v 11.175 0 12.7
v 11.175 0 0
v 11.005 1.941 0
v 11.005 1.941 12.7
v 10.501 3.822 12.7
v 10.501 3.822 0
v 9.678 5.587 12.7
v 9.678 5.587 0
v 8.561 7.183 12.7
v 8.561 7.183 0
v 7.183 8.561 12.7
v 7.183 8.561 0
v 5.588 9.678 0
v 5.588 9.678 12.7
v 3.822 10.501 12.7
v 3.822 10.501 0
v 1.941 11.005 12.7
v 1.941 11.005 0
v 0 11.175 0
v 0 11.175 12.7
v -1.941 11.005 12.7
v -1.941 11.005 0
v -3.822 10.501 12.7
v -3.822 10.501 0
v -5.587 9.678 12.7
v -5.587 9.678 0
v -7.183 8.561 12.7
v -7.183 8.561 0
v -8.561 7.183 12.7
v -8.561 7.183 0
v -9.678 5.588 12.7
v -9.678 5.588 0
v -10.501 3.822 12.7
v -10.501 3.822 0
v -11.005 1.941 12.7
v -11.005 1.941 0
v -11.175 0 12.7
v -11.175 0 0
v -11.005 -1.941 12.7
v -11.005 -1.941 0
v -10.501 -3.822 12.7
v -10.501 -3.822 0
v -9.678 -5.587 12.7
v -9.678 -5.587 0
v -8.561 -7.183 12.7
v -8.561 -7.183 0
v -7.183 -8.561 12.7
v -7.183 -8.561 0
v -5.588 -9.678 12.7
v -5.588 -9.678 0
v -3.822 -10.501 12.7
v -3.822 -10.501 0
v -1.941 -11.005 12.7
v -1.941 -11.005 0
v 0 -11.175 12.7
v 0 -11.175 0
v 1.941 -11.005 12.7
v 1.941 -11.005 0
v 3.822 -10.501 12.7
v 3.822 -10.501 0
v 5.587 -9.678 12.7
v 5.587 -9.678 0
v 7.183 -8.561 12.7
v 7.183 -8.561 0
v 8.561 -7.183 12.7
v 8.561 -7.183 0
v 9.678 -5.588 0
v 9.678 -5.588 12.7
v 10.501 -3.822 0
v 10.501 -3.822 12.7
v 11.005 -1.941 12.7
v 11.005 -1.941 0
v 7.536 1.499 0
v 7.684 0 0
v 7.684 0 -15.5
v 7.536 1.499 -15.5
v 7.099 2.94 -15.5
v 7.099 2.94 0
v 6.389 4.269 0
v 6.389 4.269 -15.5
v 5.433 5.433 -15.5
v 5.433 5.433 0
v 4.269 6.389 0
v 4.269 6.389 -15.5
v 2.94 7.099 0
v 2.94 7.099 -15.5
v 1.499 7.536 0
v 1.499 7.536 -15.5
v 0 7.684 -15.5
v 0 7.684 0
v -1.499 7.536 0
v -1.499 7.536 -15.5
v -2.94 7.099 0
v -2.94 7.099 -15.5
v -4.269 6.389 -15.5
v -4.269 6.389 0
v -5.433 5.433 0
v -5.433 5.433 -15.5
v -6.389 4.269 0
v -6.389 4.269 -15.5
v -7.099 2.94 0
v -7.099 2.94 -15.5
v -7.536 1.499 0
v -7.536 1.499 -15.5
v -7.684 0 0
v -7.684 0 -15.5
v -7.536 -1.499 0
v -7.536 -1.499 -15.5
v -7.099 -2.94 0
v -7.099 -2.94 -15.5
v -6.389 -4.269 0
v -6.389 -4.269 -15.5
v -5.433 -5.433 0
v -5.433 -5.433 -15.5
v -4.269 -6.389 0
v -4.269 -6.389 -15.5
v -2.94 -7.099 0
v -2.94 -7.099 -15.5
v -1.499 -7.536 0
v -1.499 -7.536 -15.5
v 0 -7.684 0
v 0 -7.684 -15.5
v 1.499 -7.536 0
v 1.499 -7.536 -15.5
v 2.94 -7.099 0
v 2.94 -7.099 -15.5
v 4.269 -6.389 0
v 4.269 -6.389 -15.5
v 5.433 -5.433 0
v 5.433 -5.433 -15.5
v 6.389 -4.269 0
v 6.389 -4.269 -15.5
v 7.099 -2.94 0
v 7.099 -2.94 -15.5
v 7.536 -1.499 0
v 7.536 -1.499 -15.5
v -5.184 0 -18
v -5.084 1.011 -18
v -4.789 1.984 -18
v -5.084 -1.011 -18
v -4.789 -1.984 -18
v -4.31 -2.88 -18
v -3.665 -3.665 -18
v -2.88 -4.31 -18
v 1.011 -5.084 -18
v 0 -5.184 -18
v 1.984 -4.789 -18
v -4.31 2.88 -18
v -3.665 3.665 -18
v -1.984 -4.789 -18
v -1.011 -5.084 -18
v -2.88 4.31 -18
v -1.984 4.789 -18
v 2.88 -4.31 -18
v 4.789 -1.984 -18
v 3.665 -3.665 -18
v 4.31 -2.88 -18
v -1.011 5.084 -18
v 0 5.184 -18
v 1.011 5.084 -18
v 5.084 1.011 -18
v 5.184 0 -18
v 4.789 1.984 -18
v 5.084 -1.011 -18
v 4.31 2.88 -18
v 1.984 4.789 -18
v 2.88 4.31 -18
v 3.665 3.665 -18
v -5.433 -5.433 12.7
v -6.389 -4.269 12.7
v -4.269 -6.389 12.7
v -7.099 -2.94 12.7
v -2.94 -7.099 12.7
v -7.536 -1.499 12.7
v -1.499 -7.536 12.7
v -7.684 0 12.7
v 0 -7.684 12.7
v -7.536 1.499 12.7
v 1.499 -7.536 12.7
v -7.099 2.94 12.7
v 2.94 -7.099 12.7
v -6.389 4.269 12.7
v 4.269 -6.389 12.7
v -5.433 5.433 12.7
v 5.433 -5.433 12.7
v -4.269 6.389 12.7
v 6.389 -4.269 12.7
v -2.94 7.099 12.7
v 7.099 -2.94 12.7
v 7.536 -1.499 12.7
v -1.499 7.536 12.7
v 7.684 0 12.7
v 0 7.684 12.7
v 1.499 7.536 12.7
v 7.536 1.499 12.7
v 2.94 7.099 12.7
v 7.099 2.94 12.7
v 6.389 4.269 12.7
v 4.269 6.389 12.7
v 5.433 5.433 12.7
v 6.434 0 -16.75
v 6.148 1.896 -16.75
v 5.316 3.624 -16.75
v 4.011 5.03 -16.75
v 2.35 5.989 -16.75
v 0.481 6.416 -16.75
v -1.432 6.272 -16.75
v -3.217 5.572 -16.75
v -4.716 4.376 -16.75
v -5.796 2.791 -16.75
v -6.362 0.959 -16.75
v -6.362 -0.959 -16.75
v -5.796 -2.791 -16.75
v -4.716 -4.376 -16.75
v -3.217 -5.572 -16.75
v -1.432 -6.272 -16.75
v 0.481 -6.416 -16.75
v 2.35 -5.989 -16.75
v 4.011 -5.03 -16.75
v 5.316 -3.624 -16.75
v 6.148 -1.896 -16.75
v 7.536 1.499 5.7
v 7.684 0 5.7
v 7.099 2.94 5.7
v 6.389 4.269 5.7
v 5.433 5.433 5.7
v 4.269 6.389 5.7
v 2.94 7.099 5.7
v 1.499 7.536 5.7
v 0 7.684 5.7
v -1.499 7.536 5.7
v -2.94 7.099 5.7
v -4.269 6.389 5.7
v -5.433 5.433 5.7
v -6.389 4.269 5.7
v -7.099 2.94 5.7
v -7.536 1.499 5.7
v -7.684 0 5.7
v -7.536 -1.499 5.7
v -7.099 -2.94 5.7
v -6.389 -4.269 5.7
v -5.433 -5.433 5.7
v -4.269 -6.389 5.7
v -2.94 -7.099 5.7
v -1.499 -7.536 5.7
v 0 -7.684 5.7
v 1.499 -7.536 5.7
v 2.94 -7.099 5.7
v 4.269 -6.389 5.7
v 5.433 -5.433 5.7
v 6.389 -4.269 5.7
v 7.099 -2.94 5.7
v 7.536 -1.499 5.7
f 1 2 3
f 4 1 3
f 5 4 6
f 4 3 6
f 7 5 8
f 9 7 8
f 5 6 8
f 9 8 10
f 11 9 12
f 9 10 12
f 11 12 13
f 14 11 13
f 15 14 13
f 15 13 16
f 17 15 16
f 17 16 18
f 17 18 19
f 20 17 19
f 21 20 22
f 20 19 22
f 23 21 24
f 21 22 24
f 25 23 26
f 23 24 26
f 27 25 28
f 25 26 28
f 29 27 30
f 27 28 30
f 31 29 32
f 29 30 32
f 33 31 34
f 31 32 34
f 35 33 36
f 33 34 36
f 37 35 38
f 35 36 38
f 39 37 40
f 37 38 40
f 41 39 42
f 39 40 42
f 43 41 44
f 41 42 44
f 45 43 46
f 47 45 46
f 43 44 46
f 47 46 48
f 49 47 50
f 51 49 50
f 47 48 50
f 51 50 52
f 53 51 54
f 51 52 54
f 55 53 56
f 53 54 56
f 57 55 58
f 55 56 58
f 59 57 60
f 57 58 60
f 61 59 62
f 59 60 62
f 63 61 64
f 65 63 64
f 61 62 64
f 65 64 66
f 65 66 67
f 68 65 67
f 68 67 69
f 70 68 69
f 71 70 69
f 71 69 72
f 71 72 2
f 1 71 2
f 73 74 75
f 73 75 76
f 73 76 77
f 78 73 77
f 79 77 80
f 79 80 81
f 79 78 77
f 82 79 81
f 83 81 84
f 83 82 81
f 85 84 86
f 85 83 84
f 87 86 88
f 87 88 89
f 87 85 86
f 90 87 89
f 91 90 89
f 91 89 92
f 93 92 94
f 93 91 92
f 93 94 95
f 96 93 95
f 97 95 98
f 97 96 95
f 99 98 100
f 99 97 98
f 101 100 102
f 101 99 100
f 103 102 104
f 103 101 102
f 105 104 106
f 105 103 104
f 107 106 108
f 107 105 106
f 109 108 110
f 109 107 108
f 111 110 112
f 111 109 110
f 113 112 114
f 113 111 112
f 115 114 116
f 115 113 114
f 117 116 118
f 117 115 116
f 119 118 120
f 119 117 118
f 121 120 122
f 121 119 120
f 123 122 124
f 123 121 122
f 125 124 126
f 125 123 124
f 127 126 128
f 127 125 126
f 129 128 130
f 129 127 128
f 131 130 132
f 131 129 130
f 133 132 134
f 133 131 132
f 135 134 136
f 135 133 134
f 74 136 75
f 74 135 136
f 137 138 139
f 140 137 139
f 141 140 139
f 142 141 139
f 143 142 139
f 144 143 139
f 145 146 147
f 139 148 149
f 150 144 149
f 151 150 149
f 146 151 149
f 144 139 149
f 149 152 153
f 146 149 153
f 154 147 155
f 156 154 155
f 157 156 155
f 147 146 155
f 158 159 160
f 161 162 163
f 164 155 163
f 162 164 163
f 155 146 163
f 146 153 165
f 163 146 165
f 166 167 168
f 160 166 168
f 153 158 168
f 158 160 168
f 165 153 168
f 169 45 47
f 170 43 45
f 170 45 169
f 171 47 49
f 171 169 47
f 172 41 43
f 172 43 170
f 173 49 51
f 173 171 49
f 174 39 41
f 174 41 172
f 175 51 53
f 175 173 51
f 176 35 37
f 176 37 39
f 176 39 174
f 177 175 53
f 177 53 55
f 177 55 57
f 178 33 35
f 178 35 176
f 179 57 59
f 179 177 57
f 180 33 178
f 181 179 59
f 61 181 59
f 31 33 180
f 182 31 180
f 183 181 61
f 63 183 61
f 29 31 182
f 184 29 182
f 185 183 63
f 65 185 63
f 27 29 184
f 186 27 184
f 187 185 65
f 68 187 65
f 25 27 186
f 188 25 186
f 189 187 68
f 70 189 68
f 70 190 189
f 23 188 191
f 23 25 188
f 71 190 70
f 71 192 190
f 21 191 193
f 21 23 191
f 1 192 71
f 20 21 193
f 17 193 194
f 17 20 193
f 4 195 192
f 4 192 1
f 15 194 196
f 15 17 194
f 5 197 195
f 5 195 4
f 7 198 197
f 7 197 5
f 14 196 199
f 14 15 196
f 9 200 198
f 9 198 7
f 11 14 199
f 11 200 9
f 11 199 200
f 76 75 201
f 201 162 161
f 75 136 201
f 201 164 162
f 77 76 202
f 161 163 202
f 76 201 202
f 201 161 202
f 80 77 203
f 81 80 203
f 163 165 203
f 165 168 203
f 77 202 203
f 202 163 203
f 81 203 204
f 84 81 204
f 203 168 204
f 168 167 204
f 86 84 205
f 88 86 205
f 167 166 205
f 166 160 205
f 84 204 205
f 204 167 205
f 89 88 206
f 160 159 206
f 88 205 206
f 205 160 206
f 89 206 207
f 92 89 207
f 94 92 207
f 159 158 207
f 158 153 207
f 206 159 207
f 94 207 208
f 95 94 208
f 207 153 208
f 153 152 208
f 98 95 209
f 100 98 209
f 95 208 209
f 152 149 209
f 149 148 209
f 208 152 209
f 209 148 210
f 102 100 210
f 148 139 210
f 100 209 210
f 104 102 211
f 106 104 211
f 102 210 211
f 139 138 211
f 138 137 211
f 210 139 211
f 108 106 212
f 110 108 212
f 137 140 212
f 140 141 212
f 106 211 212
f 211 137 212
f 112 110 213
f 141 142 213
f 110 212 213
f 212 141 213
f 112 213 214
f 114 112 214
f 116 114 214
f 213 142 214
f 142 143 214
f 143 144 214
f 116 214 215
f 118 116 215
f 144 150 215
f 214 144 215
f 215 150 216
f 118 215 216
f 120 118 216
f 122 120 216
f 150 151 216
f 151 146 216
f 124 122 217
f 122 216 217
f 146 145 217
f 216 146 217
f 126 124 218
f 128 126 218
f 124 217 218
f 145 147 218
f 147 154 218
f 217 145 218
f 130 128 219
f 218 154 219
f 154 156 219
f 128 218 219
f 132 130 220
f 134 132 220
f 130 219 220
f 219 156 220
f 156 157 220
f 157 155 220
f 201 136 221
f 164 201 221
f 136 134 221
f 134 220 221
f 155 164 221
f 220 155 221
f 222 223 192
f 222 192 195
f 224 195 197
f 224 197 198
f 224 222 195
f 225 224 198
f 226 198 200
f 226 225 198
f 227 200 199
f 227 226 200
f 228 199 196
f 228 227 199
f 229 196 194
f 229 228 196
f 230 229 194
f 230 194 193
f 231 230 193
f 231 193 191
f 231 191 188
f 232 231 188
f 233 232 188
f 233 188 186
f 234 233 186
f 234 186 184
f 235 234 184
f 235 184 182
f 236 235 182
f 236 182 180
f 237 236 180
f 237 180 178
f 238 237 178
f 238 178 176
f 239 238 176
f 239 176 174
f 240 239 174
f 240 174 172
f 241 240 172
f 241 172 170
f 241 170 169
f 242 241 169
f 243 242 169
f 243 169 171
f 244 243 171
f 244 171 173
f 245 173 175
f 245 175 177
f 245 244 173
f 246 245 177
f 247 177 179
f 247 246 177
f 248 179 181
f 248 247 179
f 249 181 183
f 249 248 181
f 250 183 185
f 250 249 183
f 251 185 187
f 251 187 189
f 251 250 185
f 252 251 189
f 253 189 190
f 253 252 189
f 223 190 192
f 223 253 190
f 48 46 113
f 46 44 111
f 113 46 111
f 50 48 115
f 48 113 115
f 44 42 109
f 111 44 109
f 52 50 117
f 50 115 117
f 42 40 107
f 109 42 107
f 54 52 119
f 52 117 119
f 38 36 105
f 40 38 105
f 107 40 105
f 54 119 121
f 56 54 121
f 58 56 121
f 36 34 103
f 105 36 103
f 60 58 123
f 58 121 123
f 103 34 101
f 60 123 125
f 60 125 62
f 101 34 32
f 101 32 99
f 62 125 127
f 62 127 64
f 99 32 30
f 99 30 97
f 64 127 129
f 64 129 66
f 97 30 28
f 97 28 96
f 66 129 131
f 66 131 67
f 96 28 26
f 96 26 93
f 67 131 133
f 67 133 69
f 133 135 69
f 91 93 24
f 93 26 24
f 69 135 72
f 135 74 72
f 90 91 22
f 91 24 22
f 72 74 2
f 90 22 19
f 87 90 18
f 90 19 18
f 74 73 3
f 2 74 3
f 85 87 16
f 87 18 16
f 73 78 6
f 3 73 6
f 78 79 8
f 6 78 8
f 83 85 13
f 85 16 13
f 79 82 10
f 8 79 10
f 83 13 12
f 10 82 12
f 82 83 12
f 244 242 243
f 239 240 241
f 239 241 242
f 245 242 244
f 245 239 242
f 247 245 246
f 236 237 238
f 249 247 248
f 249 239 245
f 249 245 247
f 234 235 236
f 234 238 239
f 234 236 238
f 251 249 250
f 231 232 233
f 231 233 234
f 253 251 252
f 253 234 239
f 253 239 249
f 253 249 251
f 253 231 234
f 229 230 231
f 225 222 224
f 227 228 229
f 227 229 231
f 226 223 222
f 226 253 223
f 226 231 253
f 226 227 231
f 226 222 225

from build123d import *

# Parameters (mm, degrees)
F0_R     = 11.175
F0_R_2   = 7.6835
F1_DEPTH = 12.7
F2_DEPTH = 18
F3_DEPTH = 5.7
F4_SIZE  = 2.5


# Not quite as in the source:
# - a length typed as a fraction of an inch, garbled in the dataset ("3 / 203.2 mm" for 3/8 in), is restored


with BuildPart() as f1:
    # F0 (on Top) → F1 (new body)
    with BuildSketch(Plane.XY):
        Circle(F0_R)
        Circle(F0_R_2, mode=Mode.SUBTRACT)
    extrude(amount=F1_DEPTH)



with BuildPart() as f2:
    # F0 (on Top) → F2 (new body)
    with BuildSketch(Plane.XY):
        Circle(F0_R_2)
    extrude(amount=-F2_DEPTH)


with BuildPart() as f1_1:
    add(f1.part)

    add(f2.part)  # F3 merges F2
    # F0 (on Top) → F3 (join)
    with BuildSketch(Plane.XY):
        Circle(F0_R_2)
    extrude(amount=F3_DEPTH)

    # F4
    f4_edges = [f1_1.edges().sort_by_distance(p)[0] for p in [
        (-7.6835, 0, -18),
    ]]
    chamfer(f4_edges, length=F4_SIZE)


solid = f1_1.part
